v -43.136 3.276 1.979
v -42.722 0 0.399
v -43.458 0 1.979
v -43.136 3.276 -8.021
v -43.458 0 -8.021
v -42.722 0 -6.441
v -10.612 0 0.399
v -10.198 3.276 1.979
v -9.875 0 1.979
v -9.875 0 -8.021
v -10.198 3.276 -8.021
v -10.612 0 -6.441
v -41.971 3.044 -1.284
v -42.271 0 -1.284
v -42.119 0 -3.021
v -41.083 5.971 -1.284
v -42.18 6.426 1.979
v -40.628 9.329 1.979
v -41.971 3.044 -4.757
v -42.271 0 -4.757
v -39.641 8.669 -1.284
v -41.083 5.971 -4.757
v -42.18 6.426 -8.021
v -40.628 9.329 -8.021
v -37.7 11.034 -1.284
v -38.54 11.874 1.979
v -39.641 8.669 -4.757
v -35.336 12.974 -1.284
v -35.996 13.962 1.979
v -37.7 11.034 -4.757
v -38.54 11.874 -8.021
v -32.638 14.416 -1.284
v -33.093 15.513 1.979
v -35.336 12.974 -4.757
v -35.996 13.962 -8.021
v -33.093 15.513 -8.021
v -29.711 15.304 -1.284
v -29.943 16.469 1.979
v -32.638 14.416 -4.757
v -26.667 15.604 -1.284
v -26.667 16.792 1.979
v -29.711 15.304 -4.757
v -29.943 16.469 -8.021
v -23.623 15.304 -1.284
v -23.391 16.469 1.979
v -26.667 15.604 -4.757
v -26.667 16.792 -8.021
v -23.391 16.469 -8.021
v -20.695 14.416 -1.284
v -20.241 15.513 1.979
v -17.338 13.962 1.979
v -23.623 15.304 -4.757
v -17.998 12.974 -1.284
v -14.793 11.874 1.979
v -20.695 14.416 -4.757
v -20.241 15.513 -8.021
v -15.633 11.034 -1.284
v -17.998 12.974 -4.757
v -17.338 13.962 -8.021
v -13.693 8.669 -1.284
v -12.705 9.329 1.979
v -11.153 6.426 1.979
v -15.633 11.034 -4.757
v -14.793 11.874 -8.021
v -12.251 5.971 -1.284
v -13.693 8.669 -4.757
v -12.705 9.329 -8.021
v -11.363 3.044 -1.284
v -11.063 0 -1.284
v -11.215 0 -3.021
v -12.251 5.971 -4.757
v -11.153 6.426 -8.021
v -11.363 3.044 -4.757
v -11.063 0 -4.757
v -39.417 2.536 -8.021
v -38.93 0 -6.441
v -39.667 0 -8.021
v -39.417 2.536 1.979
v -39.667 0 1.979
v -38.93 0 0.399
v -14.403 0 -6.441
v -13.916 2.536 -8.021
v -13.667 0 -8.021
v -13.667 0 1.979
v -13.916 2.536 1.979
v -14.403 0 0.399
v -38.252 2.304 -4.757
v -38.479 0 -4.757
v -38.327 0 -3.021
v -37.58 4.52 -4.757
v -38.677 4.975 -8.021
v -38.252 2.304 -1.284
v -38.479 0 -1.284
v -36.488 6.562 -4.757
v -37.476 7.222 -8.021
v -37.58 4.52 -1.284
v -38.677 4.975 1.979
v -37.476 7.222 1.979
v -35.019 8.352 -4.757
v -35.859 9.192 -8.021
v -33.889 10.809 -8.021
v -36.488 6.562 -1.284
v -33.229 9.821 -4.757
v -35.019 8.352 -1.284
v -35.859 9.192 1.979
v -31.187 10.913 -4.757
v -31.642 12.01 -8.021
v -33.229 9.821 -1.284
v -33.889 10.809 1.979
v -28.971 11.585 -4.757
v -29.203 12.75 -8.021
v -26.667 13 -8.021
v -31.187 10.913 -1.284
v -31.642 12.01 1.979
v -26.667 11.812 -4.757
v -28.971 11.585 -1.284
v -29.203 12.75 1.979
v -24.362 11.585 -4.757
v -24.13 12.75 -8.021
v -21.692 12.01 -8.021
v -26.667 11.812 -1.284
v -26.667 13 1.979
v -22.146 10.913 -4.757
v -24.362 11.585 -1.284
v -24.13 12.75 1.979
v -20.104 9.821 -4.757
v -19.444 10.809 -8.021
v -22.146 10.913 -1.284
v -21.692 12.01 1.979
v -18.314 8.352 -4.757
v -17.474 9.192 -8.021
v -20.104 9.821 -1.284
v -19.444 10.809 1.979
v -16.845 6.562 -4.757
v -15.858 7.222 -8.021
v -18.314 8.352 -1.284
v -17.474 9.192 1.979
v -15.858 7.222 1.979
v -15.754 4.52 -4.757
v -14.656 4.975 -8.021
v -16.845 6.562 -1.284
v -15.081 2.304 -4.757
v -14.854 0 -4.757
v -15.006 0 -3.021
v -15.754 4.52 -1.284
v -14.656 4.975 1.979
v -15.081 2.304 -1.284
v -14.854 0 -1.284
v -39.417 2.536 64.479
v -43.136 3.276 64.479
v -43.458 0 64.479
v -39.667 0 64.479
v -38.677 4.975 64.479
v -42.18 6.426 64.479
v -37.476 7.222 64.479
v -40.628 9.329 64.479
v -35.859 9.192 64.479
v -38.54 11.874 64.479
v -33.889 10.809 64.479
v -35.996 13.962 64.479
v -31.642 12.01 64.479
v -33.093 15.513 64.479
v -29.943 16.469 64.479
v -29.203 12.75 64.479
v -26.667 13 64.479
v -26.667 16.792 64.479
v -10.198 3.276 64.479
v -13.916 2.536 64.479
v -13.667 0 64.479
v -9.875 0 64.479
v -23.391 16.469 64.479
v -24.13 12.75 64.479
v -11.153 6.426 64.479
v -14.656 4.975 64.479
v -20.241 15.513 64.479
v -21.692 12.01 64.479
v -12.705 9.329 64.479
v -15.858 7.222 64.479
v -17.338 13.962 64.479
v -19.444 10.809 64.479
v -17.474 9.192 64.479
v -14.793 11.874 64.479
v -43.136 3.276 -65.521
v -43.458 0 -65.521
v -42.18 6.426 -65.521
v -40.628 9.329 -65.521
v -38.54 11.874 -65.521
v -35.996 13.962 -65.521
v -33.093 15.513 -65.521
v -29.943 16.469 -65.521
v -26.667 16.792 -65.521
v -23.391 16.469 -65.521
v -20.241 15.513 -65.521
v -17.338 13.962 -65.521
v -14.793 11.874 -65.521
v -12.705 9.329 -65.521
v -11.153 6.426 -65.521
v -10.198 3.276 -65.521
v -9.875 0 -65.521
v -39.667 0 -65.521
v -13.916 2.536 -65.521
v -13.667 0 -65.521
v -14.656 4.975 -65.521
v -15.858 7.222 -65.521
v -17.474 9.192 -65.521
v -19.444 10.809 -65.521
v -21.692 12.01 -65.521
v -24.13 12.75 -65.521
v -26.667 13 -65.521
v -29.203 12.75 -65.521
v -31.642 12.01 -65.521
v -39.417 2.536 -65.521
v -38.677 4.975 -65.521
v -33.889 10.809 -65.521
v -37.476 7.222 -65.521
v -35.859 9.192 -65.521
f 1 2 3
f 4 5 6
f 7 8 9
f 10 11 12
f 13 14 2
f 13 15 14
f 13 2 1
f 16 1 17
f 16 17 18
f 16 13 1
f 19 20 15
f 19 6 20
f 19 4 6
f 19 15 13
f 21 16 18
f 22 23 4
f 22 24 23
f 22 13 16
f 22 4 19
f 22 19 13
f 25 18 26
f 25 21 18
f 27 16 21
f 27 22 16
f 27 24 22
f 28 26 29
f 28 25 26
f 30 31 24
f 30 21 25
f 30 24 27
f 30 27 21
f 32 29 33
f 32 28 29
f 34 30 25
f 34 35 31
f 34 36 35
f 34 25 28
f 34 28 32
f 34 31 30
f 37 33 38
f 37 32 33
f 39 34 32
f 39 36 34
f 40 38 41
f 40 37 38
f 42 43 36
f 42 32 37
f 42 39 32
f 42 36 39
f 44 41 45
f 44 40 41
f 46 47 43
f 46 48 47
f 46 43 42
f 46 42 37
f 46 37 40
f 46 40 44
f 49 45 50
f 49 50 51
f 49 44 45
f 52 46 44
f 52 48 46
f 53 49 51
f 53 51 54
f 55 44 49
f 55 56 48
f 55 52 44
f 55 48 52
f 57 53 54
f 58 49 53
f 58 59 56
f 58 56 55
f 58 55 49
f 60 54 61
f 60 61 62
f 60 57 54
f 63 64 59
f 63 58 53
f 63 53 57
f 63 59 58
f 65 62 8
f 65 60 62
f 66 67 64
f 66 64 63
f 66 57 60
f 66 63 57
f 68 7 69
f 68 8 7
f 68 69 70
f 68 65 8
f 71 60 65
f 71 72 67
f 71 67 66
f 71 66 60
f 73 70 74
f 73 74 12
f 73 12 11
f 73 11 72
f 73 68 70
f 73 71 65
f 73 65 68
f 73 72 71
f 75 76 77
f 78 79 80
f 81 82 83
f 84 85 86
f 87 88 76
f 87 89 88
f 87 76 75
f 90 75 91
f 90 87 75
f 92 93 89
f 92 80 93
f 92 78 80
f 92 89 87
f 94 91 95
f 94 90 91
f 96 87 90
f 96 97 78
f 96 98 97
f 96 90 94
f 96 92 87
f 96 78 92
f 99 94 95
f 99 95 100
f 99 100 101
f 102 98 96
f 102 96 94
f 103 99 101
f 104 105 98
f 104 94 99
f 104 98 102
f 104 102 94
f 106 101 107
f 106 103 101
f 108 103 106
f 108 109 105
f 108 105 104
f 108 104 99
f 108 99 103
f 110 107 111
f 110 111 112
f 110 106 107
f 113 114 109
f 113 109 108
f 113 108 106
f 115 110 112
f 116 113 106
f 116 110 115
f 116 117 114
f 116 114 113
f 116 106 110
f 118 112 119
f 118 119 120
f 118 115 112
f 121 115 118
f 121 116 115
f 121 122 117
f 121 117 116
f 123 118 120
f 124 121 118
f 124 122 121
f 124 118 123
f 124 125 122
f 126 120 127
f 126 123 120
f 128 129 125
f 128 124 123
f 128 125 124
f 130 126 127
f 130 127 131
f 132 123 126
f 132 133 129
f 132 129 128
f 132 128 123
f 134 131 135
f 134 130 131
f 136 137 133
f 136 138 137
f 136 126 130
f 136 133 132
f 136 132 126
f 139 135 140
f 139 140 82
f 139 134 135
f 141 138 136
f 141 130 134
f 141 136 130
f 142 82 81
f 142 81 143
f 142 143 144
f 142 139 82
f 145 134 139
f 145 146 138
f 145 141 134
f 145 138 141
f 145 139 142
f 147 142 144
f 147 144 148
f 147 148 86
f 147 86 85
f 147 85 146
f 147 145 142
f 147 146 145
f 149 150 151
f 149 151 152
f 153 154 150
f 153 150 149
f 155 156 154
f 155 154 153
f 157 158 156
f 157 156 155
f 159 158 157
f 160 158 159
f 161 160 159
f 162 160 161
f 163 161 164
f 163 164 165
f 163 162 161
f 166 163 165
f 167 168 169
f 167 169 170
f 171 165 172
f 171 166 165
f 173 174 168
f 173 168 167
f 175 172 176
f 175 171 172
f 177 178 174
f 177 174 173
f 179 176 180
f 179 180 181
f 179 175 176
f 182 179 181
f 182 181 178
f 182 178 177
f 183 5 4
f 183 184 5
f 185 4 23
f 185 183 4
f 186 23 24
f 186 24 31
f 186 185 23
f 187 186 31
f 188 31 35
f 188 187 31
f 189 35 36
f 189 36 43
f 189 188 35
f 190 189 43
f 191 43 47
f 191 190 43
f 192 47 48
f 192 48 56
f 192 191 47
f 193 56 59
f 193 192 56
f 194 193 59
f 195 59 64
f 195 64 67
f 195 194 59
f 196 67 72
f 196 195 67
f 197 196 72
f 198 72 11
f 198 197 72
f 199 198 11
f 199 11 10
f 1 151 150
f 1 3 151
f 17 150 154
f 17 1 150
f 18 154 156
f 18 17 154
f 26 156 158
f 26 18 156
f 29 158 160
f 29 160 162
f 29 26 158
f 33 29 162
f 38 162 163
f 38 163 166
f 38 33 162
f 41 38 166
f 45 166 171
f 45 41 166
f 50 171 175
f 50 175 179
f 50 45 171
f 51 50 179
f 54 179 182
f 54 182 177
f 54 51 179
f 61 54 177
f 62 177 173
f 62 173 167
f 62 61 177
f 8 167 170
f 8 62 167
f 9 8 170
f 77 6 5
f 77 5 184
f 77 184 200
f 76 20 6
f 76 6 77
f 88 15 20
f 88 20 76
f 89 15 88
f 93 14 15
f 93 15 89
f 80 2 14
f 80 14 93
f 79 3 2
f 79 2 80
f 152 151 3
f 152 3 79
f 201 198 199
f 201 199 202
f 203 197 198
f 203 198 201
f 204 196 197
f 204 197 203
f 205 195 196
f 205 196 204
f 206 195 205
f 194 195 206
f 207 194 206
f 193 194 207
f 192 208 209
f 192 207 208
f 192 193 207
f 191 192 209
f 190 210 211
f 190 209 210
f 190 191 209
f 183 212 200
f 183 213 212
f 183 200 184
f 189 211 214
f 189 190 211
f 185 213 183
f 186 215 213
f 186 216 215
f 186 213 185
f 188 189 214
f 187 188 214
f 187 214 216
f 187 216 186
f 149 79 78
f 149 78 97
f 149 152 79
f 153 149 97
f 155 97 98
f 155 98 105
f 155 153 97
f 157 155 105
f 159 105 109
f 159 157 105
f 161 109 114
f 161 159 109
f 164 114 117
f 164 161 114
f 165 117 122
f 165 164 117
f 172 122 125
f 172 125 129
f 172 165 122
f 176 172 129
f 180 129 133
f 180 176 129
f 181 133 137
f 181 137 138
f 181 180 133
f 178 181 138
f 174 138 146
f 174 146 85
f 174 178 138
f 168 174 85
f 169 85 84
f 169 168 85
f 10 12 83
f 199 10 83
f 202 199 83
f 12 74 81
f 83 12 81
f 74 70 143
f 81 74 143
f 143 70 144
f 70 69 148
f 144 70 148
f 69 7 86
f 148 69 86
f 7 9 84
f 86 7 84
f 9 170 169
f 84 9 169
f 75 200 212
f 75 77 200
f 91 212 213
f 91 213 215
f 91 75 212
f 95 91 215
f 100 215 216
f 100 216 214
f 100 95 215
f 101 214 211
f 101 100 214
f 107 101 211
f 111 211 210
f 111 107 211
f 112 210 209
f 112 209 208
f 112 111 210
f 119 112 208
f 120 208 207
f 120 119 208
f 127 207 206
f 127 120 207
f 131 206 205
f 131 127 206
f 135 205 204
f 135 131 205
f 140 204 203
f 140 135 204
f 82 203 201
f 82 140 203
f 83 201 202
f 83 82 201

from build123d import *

# Parameters (mm, degrees)
F1_ANGLE = 180


with BuildPart() as f1:
    # F0 (on Front) → F1 (revolve)
    with BuildSketch(Plane.XZ):
        with BuildLine():
            Line((-39.666668, 64.479168), (-43.458339, 64.479168))
            Line((-43.458339, 64.479168), (-43.458339, 1.979168))
            ThreePointArc((-43.458339, 1.979168), (-42.118593, -3.020832), (-43.458339, -8.020832))
            Line((-43.458339, -8.020832), (-43.458339, -65.520832))
            Line((-43.458339, -65.520832), (-39.666668, -65.520832))
            Line((-39.666668, -65.520832), (-39.666668, -8.020832))
            ThreePointArc((-39.666668, -8.020832), (-38.326922, -3.020832), (-39.666668, 1.979168))
            Line((-39.666668, 1.979168), (-39.666668, 64.479168))
        make_face()
    revolve(axis=Axis((-26.666668, 0, -1.708331), (0, 0, -1)), revolution_arc=F1_ANGLE)


solid = f1.part
